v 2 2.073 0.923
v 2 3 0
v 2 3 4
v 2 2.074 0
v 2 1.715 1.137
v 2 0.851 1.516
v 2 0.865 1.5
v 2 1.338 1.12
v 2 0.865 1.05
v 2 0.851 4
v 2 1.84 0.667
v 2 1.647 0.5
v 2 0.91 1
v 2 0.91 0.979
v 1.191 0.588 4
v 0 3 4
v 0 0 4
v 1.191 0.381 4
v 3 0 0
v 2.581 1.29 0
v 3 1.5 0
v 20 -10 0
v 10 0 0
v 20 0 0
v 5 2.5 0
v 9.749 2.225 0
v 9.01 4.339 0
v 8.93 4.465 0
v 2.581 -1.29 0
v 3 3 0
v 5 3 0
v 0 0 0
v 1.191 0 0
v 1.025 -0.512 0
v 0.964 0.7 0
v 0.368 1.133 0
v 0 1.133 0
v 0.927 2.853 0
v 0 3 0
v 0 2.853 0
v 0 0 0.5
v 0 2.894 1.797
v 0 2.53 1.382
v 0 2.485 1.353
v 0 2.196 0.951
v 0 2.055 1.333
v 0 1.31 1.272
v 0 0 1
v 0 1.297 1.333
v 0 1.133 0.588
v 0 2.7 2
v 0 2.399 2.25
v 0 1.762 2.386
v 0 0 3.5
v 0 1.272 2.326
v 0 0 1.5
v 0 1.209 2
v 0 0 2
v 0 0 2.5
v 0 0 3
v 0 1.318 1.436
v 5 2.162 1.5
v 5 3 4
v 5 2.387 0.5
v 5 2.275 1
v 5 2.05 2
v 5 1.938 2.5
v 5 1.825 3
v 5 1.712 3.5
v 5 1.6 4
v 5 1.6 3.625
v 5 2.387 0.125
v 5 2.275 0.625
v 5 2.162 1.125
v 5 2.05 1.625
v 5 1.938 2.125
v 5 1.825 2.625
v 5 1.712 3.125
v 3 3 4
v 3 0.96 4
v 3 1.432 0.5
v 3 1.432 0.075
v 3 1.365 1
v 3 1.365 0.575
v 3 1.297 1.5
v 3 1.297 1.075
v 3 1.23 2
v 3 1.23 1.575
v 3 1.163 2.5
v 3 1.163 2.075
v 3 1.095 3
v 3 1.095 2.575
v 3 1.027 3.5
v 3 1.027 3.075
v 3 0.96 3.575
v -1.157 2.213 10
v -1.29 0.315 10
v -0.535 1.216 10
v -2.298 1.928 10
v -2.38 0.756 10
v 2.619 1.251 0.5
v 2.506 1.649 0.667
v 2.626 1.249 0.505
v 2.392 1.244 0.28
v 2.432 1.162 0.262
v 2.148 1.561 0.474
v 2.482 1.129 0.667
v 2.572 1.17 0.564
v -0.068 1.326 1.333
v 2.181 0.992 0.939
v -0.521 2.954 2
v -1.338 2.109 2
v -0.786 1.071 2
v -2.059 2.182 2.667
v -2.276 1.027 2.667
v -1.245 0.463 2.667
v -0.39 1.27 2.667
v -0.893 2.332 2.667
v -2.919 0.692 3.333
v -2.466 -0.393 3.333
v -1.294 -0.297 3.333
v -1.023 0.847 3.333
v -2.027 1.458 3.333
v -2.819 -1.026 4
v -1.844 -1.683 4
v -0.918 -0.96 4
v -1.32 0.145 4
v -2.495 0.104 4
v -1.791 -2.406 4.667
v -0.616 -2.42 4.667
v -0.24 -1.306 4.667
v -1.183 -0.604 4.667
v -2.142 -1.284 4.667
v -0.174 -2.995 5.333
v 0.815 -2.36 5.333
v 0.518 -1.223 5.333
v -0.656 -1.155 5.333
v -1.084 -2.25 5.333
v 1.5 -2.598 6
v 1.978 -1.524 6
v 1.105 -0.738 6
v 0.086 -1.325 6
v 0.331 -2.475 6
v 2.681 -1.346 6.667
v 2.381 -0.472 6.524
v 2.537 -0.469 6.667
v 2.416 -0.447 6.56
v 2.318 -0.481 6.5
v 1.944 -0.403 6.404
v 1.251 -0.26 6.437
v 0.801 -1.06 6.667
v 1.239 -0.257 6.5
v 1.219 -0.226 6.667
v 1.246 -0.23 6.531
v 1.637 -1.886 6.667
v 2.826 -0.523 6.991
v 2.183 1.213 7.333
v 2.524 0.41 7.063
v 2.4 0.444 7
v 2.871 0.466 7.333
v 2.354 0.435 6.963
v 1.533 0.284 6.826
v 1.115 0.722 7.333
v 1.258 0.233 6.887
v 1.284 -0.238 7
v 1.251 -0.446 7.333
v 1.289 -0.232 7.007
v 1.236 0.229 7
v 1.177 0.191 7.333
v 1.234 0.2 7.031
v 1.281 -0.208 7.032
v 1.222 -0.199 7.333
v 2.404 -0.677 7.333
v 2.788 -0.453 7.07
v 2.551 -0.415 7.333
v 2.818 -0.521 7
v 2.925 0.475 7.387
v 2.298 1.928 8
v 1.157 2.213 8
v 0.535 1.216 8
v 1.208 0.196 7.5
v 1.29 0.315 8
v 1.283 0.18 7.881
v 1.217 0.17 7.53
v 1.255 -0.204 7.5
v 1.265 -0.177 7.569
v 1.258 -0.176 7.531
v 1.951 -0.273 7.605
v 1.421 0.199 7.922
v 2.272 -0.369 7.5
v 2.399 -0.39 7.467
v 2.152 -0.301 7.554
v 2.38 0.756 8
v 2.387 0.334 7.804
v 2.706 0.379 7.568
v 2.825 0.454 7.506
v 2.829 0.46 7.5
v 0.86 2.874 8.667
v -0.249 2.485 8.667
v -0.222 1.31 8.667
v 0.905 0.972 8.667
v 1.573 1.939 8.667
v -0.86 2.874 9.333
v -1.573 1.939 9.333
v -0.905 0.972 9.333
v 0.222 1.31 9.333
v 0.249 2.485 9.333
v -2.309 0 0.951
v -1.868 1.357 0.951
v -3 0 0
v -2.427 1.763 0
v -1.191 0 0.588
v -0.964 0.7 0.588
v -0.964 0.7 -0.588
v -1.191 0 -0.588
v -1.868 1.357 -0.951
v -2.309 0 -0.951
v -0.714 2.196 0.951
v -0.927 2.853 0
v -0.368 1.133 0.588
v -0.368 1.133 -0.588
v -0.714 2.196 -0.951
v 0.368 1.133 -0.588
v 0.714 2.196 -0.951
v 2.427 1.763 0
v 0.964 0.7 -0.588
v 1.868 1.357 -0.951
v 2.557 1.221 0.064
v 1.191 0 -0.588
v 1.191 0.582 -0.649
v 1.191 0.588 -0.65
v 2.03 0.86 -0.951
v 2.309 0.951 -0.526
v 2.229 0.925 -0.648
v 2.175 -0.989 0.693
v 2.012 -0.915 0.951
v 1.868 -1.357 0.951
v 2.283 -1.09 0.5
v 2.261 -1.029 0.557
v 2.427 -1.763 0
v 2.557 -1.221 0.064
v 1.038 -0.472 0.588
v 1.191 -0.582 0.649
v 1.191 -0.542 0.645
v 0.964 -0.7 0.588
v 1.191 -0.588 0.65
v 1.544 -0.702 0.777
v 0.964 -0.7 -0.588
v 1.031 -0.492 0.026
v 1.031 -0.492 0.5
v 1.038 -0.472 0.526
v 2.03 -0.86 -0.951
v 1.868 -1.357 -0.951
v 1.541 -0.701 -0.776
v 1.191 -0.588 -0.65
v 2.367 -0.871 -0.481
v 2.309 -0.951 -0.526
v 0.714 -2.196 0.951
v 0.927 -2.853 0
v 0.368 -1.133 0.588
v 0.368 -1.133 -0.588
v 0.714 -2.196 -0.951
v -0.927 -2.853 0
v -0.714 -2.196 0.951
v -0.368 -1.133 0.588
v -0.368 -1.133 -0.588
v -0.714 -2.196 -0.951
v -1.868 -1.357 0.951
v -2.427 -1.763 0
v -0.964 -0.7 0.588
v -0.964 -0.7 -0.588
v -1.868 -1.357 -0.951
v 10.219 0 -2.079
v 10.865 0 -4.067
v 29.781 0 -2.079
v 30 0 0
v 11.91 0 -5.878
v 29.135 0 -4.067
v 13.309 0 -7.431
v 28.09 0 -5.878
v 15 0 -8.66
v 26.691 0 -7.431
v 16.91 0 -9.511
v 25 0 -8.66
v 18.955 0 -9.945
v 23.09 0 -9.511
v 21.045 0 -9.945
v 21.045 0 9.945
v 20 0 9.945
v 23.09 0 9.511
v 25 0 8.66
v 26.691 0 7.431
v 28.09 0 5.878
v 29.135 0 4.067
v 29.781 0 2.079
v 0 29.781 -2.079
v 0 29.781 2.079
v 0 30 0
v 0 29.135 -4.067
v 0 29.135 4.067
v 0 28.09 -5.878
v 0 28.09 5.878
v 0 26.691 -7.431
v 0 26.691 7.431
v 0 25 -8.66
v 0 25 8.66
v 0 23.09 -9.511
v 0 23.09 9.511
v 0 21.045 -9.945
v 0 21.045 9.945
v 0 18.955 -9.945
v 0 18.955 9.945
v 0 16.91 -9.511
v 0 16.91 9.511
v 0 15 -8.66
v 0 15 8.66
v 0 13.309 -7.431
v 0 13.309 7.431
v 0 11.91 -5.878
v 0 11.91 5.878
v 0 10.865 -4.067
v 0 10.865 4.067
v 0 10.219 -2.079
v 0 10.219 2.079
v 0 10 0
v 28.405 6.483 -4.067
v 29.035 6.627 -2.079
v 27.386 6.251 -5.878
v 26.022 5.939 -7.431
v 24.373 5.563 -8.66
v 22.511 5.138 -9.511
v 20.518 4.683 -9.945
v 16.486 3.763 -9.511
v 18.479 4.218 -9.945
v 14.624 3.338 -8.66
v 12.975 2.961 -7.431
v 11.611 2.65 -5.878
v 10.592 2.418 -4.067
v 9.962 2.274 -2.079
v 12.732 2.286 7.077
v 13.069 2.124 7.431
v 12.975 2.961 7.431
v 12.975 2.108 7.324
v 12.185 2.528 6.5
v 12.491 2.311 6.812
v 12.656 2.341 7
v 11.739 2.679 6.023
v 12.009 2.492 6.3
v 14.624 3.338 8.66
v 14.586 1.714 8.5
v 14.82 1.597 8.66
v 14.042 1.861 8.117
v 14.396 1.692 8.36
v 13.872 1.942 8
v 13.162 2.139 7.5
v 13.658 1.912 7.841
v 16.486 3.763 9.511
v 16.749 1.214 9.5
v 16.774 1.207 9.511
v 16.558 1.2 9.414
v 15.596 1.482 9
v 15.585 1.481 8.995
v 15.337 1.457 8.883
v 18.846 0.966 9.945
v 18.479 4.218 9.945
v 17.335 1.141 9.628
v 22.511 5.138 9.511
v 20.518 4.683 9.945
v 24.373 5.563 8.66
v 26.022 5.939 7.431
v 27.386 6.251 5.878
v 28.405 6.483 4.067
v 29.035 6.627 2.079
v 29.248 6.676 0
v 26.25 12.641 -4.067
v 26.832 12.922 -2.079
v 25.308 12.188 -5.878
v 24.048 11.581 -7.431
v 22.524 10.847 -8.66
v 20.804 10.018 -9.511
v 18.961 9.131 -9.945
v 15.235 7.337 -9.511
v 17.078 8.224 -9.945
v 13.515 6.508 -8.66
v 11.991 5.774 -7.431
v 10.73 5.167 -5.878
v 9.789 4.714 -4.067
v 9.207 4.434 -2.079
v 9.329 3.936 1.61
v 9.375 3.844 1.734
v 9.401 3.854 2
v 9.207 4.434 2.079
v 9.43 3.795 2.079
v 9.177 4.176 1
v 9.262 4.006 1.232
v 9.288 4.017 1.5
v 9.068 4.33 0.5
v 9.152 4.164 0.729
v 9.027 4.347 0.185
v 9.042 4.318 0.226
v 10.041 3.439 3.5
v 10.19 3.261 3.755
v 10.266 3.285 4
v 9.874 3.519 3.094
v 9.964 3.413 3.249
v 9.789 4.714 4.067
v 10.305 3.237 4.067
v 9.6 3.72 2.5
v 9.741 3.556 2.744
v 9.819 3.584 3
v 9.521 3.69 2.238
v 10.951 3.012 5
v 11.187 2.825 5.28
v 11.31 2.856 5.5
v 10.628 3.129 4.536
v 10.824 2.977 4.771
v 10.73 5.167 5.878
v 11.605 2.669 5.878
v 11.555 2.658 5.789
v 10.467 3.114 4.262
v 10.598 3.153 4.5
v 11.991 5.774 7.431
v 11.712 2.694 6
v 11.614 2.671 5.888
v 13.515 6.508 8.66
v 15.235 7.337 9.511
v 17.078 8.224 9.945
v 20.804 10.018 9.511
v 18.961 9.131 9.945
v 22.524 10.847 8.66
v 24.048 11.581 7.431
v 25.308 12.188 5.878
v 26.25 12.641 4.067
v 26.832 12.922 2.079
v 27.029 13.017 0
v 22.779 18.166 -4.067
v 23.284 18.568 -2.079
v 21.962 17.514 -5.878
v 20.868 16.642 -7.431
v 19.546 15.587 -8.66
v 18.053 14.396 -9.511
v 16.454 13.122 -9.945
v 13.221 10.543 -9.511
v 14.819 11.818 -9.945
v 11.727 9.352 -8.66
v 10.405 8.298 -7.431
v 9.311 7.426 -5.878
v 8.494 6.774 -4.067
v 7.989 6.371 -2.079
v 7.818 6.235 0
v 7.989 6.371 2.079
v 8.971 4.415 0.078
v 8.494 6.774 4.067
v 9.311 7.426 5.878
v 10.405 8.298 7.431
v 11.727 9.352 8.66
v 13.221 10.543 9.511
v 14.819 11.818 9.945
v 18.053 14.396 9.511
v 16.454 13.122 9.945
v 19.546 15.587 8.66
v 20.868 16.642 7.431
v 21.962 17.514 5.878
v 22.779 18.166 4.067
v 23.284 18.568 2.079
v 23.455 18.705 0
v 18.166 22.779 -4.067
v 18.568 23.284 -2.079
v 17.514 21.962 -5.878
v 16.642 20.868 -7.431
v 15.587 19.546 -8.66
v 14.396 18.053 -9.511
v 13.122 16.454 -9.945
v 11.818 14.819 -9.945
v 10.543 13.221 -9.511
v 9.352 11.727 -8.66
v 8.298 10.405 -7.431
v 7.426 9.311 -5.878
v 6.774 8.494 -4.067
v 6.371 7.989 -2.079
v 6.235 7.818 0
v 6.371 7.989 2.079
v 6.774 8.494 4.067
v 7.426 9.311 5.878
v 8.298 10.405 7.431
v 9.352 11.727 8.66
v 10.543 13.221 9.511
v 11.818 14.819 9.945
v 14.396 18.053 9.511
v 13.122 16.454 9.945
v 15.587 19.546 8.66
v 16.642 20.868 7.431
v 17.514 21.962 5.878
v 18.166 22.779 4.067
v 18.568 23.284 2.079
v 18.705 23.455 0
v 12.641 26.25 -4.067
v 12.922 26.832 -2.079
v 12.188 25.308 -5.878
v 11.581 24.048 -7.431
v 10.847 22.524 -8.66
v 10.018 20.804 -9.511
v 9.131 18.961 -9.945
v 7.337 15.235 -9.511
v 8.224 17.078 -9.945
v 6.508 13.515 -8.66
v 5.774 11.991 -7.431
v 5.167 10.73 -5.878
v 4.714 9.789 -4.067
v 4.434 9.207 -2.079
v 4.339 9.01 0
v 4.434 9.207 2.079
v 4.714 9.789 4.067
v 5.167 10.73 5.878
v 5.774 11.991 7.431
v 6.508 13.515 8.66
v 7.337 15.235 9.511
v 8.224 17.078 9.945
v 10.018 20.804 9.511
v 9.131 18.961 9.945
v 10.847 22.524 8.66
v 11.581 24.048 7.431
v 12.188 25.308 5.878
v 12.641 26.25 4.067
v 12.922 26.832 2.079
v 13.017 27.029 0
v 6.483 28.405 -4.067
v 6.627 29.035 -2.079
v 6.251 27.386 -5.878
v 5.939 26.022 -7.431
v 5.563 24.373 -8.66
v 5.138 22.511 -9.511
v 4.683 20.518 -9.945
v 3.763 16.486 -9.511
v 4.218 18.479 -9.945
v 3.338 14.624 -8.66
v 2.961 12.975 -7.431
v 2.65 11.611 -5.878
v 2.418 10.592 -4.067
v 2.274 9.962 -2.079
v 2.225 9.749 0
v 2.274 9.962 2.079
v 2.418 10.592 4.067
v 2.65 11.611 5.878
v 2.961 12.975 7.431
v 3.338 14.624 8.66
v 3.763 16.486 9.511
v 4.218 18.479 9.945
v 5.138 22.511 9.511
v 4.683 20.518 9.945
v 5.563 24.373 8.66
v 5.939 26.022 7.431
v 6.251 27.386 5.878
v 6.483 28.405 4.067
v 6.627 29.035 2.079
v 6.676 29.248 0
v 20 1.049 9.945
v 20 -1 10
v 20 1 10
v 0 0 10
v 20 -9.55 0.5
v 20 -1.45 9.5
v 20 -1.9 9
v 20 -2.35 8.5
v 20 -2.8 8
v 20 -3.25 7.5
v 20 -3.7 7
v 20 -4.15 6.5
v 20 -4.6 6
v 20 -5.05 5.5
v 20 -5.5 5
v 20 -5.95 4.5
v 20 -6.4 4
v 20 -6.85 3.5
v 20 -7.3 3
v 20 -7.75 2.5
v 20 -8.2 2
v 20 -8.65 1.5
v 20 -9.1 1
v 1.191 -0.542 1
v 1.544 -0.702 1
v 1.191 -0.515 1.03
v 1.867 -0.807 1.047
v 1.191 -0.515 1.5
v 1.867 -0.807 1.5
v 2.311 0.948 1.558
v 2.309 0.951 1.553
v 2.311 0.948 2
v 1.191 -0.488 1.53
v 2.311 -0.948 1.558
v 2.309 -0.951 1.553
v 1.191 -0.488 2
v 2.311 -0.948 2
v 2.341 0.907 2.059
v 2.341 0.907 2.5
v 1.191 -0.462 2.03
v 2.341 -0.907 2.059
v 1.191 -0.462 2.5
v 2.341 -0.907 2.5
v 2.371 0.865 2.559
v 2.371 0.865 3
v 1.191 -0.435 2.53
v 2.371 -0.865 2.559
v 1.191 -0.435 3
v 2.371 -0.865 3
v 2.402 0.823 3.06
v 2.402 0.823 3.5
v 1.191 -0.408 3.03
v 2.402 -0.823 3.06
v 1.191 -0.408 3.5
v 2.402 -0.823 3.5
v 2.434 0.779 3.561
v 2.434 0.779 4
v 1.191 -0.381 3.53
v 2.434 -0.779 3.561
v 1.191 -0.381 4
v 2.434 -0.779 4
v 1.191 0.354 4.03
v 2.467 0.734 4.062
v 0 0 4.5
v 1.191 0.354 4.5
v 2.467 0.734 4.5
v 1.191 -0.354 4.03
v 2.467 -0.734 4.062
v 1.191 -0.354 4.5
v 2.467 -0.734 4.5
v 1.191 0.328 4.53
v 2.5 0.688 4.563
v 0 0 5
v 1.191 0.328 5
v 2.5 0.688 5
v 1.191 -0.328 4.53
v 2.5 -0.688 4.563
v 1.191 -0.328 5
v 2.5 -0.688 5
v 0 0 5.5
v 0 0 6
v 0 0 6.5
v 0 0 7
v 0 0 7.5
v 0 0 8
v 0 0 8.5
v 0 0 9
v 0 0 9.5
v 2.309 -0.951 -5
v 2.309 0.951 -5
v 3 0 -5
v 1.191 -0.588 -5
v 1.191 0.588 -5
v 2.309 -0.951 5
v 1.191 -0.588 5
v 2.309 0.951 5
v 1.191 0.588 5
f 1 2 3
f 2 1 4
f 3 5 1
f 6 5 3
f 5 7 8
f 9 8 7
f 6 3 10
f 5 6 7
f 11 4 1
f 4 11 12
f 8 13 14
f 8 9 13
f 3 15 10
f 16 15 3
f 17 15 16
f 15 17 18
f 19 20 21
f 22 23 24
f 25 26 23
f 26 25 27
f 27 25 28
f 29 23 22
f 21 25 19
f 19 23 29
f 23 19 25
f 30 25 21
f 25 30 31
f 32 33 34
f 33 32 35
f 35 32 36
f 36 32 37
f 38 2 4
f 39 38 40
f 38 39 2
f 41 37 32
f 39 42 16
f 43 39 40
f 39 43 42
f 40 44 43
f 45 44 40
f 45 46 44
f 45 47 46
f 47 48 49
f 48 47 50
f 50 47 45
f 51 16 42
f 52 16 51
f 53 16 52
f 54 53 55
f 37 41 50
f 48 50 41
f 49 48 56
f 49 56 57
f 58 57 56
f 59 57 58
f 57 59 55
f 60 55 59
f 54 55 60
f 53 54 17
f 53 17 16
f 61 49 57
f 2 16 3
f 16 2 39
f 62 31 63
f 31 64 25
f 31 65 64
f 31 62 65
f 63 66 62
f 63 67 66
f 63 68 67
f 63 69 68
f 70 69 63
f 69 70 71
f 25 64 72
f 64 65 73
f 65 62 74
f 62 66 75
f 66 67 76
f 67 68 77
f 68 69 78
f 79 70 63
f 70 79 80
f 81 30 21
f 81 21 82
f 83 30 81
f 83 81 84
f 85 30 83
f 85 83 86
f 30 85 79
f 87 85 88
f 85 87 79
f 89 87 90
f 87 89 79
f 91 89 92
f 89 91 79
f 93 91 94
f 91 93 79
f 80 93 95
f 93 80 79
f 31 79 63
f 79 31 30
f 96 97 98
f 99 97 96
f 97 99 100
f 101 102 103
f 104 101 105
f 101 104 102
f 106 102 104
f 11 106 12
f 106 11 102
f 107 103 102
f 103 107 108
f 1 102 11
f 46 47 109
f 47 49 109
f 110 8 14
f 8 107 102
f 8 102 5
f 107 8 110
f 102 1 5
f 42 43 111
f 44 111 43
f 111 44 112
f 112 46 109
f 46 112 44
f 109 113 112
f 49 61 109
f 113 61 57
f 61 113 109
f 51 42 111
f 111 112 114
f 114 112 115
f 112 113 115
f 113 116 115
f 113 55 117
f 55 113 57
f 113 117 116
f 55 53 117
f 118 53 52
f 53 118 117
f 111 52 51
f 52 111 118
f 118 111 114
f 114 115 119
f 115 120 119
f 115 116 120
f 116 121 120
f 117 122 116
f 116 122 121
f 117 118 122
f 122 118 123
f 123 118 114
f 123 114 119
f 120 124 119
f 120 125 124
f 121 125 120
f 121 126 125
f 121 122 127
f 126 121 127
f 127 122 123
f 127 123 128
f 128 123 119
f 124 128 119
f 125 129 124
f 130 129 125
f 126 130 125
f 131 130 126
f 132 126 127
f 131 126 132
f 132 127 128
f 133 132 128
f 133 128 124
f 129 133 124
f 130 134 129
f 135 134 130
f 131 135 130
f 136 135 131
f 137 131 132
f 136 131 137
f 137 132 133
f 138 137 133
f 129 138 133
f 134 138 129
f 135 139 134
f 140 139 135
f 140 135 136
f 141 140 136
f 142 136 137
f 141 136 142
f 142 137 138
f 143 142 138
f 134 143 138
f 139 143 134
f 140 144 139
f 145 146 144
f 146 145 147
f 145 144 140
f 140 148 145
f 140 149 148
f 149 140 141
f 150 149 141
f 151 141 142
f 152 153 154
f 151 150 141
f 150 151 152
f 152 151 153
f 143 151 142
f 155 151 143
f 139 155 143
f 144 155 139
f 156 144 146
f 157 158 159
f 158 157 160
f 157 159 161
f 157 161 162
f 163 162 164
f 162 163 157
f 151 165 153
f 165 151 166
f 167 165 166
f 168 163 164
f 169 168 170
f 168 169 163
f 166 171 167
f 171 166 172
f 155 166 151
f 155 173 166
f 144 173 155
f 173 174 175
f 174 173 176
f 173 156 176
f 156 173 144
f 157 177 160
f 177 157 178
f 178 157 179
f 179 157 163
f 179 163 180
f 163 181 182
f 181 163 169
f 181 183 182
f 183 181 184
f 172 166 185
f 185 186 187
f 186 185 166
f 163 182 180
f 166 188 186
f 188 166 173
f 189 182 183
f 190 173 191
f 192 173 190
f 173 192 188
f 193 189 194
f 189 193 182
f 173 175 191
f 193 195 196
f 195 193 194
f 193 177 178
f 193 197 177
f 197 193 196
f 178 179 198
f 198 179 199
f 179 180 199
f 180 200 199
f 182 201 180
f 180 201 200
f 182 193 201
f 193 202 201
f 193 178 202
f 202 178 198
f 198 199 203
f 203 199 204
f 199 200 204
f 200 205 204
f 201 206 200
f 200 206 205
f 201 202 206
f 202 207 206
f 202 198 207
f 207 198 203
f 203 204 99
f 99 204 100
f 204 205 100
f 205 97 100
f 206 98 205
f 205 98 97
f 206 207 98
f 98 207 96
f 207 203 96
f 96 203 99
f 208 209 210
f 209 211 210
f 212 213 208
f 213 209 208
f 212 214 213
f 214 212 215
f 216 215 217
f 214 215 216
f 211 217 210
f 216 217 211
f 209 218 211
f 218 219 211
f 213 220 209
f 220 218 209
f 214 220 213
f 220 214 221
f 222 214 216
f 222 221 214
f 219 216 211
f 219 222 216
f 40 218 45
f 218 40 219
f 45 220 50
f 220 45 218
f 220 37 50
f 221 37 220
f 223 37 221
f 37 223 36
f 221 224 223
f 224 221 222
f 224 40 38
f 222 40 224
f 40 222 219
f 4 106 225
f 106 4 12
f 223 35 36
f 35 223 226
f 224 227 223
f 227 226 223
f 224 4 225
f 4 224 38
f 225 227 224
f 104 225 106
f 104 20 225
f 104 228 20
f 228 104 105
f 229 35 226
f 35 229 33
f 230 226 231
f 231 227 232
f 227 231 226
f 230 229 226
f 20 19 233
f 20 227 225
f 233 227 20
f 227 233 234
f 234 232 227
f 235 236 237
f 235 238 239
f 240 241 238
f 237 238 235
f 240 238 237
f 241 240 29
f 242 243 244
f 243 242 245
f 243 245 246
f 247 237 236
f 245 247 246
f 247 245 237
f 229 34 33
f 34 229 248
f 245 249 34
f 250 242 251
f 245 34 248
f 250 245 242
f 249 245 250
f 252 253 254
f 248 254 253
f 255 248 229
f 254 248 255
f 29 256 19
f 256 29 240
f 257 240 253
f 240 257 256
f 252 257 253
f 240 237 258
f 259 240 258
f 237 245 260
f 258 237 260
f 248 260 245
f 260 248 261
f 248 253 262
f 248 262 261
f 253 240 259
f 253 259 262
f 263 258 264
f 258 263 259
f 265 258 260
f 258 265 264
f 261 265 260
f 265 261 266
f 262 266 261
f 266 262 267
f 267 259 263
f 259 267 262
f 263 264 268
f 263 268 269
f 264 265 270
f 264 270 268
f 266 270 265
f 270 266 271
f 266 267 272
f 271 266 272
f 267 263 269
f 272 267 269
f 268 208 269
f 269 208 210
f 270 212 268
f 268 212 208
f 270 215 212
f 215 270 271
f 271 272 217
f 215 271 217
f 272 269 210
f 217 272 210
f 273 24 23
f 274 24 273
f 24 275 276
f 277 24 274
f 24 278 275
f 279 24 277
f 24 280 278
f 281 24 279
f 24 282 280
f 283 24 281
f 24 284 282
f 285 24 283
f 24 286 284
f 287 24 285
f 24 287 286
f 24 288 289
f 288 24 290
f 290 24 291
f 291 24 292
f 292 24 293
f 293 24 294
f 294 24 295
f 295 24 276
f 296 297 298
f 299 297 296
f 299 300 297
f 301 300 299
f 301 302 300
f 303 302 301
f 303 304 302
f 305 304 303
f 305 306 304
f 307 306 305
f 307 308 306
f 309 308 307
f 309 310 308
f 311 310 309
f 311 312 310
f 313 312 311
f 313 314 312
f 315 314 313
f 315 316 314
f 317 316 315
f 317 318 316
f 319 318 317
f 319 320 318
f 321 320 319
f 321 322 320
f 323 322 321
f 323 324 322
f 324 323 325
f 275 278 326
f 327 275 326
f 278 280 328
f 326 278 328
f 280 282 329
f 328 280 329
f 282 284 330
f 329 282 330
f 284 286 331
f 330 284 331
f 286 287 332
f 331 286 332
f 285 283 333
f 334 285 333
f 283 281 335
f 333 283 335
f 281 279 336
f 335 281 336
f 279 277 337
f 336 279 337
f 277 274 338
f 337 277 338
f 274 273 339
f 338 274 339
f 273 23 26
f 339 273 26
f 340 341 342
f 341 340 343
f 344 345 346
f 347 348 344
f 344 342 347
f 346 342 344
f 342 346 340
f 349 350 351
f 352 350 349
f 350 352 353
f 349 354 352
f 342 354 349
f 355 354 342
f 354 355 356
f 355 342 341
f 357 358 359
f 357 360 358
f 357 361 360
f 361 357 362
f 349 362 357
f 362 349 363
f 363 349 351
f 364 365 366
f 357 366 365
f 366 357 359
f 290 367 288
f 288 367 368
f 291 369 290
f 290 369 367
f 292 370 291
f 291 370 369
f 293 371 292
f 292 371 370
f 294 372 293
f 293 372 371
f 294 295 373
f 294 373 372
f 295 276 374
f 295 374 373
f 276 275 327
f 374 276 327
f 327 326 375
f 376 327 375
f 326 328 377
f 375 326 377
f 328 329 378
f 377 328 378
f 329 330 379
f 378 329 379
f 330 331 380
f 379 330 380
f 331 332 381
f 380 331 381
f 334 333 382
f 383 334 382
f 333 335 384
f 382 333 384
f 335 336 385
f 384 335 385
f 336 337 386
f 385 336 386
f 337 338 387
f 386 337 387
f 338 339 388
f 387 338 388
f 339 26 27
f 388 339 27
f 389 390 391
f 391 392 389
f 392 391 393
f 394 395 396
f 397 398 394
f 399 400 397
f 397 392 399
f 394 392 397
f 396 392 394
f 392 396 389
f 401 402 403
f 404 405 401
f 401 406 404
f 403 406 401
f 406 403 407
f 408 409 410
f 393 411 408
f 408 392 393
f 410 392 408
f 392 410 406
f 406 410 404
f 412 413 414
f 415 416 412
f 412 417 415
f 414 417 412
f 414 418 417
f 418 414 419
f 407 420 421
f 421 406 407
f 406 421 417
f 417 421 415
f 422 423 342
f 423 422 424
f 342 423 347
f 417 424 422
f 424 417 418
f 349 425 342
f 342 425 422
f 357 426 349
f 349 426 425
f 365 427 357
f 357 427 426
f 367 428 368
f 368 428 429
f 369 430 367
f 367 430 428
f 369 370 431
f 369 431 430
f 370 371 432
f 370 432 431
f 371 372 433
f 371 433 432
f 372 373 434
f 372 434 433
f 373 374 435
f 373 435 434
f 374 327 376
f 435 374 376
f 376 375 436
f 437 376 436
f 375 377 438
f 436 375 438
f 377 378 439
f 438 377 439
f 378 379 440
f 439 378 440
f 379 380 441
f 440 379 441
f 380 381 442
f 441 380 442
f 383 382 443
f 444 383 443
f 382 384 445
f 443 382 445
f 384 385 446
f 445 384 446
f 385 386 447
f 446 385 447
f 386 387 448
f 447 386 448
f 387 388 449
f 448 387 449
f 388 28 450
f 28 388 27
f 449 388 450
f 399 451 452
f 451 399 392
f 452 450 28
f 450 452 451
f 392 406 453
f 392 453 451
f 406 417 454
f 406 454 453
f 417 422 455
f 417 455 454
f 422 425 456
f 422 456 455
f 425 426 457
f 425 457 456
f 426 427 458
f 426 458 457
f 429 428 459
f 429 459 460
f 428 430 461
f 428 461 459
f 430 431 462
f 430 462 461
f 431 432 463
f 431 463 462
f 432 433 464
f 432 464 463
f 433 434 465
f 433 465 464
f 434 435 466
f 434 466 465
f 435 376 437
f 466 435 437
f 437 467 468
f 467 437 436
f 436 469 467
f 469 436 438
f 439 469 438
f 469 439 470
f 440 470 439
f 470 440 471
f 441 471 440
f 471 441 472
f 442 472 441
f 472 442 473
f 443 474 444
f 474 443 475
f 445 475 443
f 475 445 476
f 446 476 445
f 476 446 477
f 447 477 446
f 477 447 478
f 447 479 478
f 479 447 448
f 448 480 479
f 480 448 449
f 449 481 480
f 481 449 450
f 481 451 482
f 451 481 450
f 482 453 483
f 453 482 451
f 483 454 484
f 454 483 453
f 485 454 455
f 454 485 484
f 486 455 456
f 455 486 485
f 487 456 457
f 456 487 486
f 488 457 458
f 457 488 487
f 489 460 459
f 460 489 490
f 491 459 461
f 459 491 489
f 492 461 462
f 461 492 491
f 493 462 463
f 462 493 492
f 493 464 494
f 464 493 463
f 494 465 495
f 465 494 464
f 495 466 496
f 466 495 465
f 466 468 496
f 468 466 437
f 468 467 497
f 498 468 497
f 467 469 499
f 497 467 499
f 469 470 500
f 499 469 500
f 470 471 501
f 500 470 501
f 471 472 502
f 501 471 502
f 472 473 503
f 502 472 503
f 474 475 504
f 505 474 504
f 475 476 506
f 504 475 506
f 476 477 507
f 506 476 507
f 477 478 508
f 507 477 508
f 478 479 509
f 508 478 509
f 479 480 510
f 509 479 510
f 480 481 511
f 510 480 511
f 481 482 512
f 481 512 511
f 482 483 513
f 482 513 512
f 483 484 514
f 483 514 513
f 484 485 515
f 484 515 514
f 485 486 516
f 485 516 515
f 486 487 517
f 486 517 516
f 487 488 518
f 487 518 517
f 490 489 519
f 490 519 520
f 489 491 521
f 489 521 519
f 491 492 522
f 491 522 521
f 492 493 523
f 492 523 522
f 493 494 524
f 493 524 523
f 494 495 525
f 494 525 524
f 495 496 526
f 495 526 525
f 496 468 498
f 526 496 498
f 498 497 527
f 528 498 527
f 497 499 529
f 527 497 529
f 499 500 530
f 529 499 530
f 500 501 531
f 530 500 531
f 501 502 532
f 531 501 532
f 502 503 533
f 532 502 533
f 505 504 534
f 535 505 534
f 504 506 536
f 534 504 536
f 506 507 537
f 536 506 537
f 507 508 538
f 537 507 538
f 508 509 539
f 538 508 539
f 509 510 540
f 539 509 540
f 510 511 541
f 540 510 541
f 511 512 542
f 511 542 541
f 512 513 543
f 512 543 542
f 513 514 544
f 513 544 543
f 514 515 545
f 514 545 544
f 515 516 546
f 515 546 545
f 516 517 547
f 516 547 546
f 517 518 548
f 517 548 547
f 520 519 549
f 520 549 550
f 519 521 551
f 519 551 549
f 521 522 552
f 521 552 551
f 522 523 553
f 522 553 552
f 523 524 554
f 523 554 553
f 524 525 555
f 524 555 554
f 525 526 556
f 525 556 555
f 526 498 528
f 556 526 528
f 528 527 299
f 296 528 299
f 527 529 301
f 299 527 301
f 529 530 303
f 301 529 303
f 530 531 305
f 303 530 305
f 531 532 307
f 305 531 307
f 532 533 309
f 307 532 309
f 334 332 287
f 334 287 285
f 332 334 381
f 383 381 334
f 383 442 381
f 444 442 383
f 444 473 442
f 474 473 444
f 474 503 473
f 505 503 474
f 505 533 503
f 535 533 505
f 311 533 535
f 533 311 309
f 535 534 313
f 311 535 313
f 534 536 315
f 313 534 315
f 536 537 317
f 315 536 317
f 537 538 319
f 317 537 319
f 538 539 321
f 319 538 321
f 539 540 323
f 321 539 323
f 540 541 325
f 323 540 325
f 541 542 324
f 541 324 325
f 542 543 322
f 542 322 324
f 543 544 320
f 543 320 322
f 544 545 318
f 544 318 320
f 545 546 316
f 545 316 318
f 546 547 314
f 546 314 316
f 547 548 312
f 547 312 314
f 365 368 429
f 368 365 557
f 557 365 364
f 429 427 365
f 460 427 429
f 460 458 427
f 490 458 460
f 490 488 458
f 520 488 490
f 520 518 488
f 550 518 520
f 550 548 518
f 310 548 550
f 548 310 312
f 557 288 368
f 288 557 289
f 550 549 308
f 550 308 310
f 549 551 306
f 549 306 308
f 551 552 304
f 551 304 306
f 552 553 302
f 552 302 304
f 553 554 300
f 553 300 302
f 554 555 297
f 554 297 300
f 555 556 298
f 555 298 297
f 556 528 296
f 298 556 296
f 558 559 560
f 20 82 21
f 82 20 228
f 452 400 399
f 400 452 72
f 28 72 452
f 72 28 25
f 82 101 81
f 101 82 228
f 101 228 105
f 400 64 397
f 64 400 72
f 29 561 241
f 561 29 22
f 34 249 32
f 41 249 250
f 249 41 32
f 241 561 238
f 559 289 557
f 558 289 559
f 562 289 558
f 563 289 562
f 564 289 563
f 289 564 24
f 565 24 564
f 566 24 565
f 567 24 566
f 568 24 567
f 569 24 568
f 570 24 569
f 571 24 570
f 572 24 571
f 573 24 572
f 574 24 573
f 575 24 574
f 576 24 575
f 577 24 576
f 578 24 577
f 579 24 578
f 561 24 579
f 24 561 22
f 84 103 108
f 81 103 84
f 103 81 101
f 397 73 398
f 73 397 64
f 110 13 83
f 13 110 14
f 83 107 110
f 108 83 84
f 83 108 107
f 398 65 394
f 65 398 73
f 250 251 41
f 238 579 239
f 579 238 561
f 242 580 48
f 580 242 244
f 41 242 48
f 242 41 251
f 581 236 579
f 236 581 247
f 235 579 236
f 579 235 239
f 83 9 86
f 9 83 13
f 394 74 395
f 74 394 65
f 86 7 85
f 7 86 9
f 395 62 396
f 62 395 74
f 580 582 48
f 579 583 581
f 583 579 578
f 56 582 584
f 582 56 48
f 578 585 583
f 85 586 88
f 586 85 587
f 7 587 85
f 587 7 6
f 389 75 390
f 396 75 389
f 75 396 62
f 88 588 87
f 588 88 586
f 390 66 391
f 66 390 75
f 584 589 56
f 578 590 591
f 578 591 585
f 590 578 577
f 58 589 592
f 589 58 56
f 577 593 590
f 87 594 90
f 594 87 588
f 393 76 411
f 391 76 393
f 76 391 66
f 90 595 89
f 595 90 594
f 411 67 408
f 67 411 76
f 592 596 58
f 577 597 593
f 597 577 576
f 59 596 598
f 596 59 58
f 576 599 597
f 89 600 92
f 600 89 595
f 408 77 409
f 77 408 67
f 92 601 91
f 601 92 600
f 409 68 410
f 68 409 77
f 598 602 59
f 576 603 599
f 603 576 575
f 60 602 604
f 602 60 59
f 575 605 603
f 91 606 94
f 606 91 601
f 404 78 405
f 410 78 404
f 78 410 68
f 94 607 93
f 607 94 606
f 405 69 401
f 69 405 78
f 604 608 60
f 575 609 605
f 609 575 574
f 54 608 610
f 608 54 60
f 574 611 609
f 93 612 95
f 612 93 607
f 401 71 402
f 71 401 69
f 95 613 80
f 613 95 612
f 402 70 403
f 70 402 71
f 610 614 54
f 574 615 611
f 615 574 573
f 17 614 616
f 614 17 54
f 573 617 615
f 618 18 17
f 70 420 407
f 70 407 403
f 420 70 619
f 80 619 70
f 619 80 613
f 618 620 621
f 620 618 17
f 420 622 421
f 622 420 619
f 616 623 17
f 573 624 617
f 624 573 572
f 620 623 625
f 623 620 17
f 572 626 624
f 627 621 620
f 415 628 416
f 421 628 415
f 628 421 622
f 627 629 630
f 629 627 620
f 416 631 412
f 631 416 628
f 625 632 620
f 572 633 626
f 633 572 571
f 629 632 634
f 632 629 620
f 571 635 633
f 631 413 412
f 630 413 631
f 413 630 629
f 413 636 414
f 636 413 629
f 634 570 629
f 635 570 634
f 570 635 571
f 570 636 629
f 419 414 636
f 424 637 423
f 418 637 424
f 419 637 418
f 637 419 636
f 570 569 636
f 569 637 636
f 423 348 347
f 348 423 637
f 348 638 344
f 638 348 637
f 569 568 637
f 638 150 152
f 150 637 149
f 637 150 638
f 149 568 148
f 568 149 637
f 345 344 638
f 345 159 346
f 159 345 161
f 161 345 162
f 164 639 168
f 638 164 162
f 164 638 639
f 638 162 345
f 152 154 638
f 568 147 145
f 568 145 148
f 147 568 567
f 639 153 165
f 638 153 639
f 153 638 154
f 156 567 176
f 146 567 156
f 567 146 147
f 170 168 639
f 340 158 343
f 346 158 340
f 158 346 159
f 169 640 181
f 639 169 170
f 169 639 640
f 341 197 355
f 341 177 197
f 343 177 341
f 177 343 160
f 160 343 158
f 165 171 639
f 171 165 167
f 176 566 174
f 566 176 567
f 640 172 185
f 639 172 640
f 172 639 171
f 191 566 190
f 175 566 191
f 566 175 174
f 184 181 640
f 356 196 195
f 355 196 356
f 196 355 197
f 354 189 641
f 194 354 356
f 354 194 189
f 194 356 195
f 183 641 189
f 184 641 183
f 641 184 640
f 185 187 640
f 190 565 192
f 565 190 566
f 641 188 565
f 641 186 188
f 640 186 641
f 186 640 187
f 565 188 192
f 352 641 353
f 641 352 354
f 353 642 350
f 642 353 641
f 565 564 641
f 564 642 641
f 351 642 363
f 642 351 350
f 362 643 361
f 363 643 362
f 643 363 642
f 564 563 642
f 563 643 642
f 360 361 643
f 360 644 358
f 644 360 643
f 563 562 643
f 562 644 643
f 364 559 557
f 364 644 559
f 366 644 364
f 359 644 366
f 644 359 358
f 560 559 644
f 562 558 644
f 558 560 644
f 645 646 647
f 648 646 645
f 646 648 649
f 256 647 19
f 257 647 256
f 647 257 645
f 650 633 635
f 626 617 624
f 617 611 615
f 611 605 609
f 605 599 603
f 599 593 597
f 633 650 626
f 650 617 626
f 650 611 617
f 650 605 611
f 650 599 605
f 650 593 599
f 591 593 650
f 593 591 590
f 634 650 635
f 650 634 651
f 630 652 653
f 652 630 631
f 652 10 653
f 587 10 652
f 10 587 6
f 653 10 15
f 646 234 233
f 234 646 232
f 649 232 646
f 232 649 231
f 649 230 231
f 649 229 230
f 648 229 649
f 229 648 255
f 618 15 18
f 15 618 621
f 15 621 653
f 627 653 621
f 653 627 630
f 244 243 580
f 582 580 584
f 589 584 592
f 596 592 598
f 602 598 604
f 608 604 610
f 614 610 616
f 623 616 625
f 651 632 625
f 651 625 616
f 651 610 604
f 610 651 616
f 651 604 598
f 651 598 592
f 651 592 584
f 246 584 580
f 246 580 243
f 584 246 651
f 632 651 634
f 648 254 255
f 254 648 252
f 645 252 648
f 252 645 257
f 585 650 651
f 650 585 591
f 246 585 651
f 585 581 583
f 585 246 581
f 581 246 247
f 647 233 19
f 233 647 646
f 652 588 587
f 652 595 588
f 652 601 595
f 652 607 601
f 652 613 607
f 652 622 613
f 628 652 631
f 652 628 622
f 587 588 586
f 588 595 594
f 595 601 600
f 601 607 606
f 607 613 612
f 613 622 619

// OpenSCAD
cube([2,3,4]);
translate([3,0,0]) {
  cube([2,3,4]);
}
cube([2,3,4]);
translate([3,0,0]) {
  cube([2,3,4]);
}
linear_extrude(height = 10, center = false, convexity = 10, twist = -500)
translate([2, 0, 0])
circle(r = 1);
rotate_extrude(convexity = 10)
translate([2, 0, 0])
circle(r = 1)
translate([0,60,0])
   rotate_extrude(angle=270, convexity=10)
       translate([40, 0]) circle(10);
rotate_extrude(angle=90, convexity=10)
   translate([20, 0]) circle(10)
translate([20,0,0]) 
   rotate([90,0,0]) cylinder(r=10,h=80)
difference() {
		cube (size = [2,2,2]);
		# translate ([0.5,0.5,-0.5]) {
	    cube (size = [1,1,3]);	
	}
}
surface(file = "surface.dat", center = true, convexity = 5);
%translate([0,0,5])cube([10,10,10], center =true);
linear_extrude(height=10, scale=[1,0.1], slices=20, twist=0)
 polygon(points=[[0,0],[20,10],[20,-10]]);
linear_extrude(height = 10, center = true, convexity = 10, twist = 0)
translate([2, 0, 0])
circle(r = 1);
